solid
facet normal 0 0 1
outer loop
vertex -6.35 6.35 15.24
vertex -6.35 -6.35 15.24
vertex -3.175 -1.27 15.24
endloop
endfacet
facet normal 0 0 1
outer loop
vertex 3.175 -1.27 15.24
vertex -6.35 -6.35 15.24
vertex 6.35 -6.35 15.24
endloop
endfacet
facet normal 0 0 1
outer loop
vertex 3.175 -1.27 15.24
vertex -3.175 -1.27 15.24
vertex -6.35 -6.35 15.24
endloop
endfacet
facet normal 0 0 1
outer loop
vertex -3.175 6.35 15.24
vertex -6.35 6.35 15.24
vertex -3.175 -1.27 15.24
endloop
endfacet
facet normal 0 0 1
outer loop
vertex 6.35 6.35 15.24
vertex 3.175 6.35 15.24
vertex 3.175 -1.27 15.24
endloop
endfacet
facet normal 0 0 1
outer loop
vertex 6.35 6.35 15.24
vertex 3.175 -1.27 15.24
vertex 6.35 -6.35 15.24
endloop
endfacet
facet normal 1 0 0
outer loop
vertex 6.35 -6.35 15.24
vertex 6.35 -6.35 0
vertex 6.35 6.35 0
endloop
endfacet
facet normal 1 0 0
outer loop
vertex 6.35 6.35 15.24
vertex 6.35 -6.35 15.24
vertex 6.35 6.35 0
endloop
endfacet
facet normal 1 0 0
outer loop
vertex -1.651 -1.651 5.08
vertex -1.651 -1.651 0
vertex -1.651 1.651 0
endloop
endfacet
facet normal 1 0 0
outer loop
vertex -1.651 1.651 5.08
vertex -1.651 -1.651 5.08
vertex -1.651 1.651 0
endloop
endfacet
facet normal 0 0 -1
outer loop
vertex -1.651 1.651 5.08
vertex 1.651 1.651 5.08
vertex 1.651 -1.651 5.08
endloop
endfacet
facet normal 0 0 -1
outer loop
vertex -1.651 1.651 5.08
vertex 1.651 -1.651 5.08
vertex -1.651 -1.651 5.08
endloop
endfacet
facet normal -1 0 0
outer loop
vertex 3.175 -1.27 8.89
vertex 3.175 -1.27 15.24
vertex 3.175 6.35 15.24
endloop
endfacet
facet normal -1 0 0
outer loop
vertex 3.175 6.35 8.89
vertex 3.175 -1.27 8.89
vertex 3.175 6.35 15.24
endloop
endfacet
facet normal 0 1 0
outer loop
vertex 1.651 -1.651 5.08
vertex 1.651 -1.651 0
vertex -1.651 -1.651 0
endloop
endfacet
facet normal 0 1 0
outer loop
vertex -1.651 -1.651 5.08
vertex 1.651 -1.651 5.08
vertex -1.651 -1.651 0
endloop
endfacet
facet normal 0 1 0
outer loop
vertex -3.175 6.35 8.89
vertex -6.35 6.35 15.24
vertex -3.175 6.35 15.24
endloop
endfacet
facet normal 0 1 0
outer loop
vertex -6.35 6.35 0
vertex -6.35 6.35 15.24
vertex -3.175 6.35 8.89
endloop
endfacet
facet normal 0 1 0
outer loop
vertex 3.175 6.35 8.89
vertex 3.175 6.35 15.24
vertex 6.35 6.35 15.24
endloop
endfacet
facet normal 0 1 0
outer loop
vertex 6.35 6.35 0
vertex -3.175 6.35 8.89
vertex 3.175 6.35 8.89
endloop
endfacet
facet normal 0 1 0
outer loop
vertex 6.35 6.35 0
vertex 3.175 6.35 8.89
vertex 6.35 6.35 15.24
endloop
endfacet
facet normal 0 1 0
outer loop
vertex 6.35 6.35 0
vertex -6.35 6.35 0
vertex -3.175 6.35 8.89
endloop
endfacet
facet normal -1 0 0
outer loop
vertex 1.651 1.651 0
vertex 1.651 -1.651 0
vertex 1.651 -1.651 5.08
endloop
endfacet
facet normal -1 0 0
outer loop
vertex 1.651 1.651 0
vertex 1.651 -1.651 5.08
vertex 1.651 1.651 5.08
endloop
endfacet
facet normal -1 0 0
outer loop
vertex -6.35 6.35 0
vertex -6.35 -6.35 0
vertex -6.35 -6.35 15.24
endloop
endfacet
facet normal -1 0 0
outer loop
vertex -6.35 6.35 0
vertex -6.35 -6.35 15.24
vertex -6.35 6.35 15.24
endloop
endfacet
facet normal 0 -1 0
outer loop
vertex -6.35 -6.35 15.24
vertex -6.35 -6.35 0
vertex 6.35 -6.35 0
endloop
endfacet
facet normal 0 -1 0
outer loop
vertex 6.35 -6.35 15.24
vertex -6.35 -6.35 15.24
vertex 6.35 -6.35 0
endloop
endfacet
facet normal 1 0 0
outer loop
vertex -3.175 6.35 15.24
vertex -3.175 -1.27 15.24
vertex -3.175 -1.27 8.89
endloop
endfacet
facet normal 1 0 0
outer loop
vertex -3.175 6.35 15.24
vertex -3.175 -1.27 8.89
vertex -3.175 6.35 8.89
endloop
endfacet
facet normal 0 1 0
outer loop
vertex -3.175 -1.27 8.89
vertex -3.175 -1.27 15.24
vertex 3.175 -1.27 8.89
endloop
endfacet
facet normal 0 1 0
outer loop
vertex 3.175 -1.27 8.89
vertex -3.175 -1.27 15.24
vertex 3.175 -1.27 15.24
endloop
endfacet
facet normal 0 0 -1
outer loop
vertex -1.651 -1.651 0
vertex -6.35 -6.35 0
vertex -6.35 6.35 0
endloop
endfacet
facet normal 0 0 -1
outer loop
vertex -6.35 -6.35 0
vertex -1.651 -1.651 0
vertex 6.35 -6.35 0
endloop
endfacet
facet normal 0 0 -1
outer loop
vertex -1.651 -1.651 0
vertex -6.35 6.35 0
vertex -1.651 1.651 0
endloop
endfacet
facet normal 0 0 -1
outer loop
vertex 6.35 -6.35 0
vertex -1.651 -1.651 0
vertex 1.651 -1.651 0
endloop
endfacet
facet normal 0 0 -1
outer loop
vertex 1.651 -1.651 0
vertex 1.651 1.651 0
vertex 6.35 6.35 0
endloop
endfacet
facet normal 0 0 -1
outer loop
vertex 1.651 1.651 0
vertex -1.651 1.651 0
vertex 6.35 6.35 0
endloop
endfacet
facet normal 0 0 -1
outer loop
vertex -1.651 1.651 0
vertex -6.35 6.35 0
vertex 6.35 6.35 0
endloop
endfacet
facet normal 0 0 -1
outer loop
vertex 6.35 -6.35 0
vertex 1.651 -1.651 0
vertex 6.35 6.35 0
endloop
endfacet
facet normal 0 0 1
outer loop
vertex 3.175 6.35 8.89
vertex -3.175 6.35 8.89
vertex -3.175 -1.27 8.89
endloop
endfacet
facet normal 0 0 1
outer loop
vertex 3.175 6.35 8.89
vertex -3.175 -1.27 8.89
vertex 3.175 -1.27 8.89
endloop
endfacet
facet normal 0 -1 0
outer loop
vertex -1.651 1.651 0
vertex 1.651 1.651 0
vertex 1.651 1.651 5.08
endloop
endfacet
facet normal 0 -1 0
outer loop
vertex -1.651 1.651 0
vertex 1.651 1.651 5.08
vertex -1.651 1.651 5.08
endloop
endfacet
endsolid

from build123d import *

# Parameters (mm, degrees)
SKETCH1_W           = 12.7
SKETCH1_H           = 12.7
BOSS_EXTRUDE1_DEPTH = 15.24
SKETCH2_W           = 6.35
SKETCH2_H           = 7.62
CUT_EXTRUDE1_DEPTH  = 6.35
SKETCH3_W           = 3.302040176
SKETCH3_H           = 3.302040176
CUT_EXTRUDE2_DEPTH  = 5.08


with BuildPart() as part:
    # Sketch1 → Boss-Extrude1 (new body)
    with BuildSketch(Plane.XY):
        Rectangle(SKETCH1_W, SKETCH1_H)
    extrude(amount=BOSS_EXTRUDE1_DEPTH)

    # Sketch2 → Cut-Extrude1 (cut)
    with BuildSketch(Plane.XY.offset(15.24)):
        with Locations((0, 2.54)):
            Rectangle(SKETCH2_W, SKETCH2_H)
    extrude(amount=-CUT_EXTRUDE1_DEPTH, mode=Mode.SUBTRACT)

    # Sketch3 → Cut-Extrude2 (cut)
    with BuildSketch(Plane(origin=(0, 0, 0), x_dir=(-1, 0, 0), z_dir=(0, 0, -1))):
        Rectangle(SKETCH3_W, SKETCH3_H)
    extrude(amount=-CUT_EXTRUDE2_DEPTH, mode=Mode.SUBTRACT)


solid = part.part
